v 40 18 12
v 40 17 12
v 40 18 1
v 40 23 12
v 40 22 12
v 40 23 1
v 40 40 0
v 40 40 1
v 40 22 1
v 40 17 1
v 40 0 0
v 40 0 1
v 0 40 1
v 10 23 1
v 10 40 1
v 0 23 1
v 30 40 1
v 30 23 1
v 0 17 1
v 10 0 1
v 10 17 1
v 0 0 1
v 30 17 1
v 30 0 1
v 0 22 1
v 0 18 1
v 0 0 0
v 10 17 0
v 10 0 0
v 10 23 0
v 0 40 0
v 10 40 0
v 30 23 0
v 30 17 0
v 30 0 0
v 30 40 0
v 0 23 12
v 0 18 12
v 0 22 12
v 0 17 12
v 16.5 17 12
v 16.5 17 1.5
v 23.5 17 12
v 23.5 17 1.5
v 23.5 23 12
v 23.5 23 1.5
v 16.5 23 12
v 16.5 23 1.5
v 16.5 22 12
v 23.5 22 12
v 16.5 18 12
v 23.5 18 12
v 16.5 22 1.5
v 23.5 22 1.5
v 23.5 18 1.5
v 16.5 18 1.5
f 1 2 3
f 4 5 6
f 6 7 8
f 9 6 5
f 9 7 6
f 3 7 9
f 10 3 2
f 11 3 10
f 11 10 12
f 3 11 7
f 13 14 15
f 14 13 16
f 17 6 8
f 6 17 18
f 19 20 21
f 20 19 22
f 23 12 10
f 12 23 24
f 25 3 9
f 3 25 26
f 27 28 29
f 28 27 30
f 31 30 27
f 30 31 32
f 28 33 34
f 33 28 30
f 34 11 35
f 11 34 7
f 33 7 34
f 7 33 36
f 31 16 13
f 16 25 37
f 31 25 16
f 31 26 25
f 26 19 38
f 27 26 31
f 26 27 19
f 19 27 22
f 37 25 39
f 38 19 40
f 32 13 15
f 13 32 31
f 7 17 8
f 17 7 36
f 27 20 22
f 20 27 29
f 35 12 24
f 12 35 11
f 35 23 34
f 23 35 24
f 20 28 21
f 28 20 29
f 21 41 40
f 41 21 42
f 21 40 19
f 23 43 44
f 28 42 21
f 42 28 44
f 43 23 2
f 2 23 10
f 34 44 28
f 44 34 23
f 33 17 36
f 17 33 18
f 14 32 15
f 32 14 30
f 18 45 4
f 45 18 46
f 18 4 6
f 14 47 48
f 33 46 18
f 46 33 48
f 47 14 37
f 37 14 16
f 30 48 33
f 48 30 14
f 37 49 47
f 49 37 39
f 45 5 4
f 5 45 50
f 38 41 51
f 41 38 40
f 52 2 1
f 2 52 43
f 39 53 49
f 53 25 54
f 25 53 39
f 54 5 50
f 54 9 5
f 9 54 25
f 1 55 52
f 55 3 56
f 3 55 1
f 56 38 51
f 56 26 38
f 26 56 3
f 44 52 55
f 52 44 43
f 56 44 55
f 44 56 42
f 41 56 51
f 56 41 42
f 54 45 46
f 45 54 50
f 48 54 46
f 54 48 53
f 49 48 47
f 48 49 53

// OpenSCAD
difference() {
cube([40,40,1]);
translate([10,0,0]) cube([20,17,1]);
translate([10,23,0]) cube([20,17,1]);
}

difference() {
translate([0,17,0]) difference() {
cube([40,6,12]);
translate([0,1,1]) cube([40,4,11]);
}
#translate([16.5,17,1.5]) cube([7,1,10.5]);
#translate([16.5,22,1.5]) cube([7,1,10.5]);
}
